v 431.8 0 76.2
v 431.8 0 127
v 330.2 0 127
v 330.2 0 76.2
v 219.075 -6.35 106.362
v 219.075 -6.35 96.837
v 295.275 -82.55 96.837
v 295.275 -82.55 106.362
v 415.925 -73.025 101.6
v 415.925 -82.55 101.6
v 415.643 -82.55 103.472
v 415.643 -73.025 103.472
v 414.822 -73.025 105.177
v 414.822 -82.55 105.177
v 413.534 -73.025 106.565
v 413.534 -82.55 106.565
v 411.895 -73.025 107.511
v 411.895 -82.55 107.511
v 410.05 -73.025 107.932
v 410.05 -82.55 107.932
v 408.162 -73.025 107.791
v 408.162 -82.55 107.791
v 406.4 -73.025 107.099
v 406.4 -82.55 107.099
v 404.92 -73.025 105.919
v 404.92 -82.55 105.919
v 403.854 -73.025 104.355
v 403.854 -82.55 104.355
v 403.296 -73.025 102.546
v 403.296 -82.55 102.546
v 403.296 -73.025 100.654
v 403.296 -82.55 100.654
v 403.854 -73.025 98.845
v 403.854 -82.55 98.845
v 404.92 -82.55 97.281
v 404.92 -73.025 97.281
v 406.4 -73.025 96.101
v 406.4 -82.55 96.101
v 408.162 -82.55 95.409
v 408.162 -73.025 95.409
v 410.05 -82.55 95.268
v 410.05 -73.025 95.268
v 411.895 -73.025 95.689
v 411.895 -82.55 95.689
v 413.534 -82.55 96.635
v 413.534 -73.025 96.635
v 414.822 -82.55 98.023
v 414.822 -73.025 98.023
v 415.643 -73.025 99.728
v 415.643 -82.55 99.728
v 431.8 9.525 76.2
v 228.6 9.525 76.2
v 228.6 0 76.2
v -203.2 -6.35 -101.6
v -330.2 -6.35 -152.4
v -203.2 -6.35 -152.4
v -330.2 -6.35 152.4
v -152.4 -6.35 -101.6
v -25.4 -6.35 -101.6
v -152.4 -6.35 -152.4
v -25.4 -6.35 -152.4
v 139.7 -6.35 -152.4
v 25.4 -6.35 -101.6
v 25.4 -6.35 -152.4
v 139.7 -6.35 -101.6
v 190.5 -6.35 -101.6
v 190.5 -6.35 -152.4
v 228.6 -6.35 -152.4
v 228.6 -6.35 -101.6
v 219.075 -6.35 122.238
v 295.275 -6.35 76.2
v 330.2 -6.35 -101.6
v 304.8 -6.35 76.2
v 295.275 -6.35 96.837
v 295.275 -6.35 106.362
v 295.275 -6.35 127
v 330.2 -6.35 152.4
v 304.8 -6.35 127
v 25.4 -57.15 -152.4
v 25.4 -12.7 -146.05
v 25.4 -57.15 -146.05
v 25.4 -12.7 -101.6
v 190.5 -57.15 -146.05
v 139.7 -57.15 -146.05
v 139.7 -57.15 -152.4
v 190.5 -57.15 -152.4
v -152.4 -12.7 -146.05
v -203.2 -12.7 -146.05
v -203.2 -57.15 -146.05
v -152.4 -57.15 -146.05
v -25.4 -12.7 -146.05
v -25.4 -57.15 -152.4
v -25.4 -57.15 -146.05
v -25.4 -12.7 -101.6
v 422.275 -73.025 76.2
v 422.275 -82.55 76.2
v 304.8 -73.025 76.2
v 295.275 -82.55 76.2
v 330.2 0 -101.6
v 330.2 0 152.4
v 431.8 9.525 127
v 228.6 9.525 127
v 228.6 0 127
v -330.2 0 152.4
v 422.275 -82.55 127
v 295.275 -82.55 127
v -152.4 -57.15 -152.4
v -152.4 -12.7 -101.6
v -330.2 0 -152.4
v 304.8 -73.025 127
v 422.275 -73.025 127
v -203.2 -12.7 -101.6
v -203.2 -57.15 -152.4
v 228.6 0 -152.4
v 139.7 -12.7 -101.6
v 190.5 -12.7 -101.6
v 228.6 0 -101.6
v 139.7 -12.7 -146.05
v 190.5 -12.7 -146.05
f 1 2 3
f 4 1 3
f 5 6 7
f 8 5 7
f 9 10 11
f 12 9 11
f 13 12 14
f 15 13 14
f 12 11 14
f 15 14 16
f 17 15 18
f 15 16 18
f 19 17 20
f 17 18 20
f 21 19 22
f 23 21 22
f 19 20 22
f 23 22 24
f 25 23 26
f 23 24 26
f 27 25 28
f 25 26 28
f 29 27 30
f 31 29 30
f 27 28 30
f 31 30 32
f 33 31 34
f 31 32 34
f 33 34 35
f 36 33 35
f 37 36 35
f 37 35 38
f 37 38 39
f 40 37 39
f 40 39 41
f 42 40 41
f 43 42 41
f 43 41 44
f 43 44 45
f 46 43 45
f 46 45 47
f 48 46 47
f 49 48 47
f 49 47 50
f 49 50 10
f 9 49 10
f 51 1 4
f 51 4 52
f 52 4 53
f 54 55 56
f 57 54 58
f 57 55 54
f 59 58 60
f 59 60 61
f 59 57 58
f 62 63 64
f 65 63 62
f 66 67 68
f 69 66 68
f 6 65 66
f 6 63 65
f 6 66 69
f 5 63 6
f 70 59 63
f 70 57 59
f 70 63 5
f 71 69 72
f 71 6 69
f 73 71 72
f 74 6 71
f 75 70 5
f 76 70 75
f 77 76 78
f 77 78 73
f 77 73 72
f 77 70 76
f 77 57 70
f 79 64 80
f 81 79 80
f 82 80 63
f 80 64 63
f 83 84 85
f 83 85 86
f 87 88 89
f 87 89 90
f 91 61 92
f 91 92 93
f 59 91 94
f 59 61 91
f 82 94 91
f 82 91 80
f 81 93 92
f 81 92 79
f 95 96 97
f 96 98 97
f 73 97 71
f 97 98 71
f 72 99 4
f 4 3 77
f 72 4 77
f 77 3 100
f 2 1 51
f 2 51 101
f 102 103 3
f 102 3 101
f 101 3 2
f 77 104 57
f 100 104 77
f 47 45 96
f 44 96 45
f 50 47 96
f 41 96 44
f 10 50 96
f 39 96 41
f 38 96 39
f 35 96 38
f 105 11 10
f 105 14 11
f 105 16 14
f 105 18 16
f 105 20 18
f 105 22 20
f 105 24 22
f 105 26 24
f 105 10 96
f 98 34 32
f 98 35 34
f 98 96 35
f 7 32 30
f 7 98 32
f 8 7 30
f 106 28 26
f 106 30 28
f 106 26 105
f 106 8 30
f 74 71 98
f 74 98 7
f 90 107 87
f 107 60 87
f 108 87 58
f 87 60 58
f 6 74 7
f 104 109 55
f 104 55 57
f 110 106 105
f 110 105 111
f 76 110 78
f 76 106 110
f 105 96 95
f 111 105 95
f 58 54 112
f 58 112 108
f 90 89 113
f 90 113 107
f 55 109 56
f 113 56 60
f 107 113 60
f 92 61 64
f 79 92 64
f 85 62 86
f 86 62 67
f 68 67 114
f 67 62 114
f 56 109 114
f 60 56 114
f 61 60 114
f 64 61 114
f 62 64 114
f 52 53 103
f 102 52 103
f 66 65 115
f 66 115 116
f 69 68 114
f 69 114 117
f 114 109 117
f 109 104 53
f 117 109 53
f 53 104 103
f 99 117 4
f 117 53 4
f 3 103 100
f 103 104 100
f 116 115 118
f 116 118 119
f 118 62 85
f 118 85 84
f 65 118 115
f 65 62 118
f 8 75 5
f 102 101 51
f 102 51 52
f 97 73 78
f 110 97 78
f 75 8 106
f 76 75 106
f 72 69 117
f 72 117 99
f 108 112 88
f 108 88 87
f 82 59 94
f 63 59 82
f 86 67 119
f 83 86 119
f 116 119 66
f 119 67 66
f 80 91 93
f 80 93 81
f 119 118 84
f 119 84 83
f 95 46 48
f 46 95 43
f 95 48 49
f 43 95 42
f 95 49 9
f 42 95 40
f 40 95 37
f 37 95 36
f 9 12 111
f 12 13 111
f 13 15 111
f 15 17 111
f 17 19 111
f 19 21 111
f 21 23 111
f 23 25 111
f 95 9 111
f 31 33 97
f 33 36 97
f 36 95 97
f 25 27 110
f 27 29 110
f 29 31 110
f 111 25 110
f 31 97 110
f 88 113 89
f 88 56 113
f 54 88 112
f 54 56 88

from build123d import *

# Parameters (mm, degrees)
F0_W      = 660.4
F0_H      = 304.8
F1_DEPTH  = 6.35
F2_W      = 50.8
F2_H      = 50.8
F3_DEPTH  = 6.35
F4_W      = 50.8
F4_H      = 6.35
F5_W      = 50.8
F5_H      = 6.35
F6_W      = 50.8
F6_H      = 6.35
F7_DEPTH  = 44.45
F8_W      = 101.6
F8_H      = 50.8
F9_DEPTH  = 9.525
F10_W     = 101.6
F10_H     = 50.8
F11_DEPTH = 25.4
F12_W     = 9.525
F12_H     = 50.8
F13_DEPTH = 76.2
F14_W     = 9.525
F14_H     = 50.8
F15_DEPTH = 117.475
F16_R     = 6.35
F17_DEPTH = 25.4
F18_W     = 76.2
F18_H     = 9.525
F19_DEPTH = 76.2
F21_DEPTH = 25.4


with BuildPart() as f1:
    # F0 (on Front) → F1 (new body)
    with BuildSketch(Plane.XZ):
        Rectangle(F0_W, F0_H)
    extrude(amount=F1_DEPTH)

    # F2 (on face) → F3 (join)
    with BuildSketch(Plane.XZ.offset(6.35)):
        with Locations((165.1, -127)):
            Rectangle(F2_W, F2_H)
        with Locations((0, -127)):
            Rectangle(F2_W, F2_H)
        with Locations((-177.8, -127)):
            Rectangle(F2_W, F2_H)
    extrude(amount=F3_DEPTH)

    # F4 (on face) + F5 (on face) + F6 (on face) → F7 (join)
    with BuildSketch(Plane.XZ.offset(12.7)):
        with Locations((-177.8, -149.225)):
            Rectangle(F4_W, F4_H)
    with BuildSketch(Plane.XZ.offset(12.7)):
        with Locations((0, -149.225)):
            Rectangle(F5_W, F5_H)
    with BuildSketch(Plane.XZ.offset(12.7)):
        with Locations((165.1, -149.225)):
            Rectangle(F6_W, F6_H)
    extrude(amount=F7_DEPTH)

    # F8 (on face) → F9 (join)
    with BuildSketch(Plane(origin=(0, 0, 0), x_dir=(-1, 0, 0), z_dir=(0, 1, 0))):
        with Locations((-381, 101.6)):
            Rectangle(F8_W, F8_H)
        with Locations((-279.4, 101.6)):
            Rectangle(F8_W, F8_H)
    extrude(amount=F9_DEPTH)

    # F10 (on face) → F11 (cut)
    with BuildSketch(Plane.XZ.offset(6.35)):
        with Locations((279.4, -127)):
            Rectangle(F10_W, F10_H)
    extrude(amount=-F11_DEPTH, mode=Mode.SUBTRACT)

    # F12 (on face) → F13 (join)
    with BuildSketch(Plane.XZ.offset(6.35)):
        with Locations((300.0375, 101.6)):
            Rectangle(F12_W, F12_H)
    extrude(amount=F13_DEPTH)

    # F14 (on face) → F15 (join)
    with BuildSketch(Plane.YZ.offset(304.8)):
        with Locations((-77.7875, 101.6)):
            Rectangle(F14_W, F14_H)
    extrude(amount=F15_DEPTH)

    # F16 (on face) → F17 (cut)
    with BuildSketch(Plane.XZ.offset(82.55)):
        with Locations((409.575, 101.6)):
            Circle(F16_R)
    extrude(amount=-F17_DEPTH, mode=Mode.SUBTRACT)

    # F18 (on face) → F19 (join)
    with BuildSketch(Plane(origin=(295.275, 0, 0), x_dir=(0, -1, 0), z_dir=(-1, 0, 0))):
        with Locations((44.45, 101.6)):
            Rectangle(F18_W, F18_H)
    extrude(amount=F19_DEPTH)

    # F20 (on face) → F21 (cut)
    with BuildSketch(Plane(origin=(0, 0, 96.8375), x_dir=(1, 0, 0), z_dir=(0, 0, -1))):
        Polygon((219.075, 82.55), (219.075, 6.35), (295.275, 82.55), align=None)
    extrude(amount=-F21_DEPTH, mode=Mode.SUBTRACT)


solid = f1.part
